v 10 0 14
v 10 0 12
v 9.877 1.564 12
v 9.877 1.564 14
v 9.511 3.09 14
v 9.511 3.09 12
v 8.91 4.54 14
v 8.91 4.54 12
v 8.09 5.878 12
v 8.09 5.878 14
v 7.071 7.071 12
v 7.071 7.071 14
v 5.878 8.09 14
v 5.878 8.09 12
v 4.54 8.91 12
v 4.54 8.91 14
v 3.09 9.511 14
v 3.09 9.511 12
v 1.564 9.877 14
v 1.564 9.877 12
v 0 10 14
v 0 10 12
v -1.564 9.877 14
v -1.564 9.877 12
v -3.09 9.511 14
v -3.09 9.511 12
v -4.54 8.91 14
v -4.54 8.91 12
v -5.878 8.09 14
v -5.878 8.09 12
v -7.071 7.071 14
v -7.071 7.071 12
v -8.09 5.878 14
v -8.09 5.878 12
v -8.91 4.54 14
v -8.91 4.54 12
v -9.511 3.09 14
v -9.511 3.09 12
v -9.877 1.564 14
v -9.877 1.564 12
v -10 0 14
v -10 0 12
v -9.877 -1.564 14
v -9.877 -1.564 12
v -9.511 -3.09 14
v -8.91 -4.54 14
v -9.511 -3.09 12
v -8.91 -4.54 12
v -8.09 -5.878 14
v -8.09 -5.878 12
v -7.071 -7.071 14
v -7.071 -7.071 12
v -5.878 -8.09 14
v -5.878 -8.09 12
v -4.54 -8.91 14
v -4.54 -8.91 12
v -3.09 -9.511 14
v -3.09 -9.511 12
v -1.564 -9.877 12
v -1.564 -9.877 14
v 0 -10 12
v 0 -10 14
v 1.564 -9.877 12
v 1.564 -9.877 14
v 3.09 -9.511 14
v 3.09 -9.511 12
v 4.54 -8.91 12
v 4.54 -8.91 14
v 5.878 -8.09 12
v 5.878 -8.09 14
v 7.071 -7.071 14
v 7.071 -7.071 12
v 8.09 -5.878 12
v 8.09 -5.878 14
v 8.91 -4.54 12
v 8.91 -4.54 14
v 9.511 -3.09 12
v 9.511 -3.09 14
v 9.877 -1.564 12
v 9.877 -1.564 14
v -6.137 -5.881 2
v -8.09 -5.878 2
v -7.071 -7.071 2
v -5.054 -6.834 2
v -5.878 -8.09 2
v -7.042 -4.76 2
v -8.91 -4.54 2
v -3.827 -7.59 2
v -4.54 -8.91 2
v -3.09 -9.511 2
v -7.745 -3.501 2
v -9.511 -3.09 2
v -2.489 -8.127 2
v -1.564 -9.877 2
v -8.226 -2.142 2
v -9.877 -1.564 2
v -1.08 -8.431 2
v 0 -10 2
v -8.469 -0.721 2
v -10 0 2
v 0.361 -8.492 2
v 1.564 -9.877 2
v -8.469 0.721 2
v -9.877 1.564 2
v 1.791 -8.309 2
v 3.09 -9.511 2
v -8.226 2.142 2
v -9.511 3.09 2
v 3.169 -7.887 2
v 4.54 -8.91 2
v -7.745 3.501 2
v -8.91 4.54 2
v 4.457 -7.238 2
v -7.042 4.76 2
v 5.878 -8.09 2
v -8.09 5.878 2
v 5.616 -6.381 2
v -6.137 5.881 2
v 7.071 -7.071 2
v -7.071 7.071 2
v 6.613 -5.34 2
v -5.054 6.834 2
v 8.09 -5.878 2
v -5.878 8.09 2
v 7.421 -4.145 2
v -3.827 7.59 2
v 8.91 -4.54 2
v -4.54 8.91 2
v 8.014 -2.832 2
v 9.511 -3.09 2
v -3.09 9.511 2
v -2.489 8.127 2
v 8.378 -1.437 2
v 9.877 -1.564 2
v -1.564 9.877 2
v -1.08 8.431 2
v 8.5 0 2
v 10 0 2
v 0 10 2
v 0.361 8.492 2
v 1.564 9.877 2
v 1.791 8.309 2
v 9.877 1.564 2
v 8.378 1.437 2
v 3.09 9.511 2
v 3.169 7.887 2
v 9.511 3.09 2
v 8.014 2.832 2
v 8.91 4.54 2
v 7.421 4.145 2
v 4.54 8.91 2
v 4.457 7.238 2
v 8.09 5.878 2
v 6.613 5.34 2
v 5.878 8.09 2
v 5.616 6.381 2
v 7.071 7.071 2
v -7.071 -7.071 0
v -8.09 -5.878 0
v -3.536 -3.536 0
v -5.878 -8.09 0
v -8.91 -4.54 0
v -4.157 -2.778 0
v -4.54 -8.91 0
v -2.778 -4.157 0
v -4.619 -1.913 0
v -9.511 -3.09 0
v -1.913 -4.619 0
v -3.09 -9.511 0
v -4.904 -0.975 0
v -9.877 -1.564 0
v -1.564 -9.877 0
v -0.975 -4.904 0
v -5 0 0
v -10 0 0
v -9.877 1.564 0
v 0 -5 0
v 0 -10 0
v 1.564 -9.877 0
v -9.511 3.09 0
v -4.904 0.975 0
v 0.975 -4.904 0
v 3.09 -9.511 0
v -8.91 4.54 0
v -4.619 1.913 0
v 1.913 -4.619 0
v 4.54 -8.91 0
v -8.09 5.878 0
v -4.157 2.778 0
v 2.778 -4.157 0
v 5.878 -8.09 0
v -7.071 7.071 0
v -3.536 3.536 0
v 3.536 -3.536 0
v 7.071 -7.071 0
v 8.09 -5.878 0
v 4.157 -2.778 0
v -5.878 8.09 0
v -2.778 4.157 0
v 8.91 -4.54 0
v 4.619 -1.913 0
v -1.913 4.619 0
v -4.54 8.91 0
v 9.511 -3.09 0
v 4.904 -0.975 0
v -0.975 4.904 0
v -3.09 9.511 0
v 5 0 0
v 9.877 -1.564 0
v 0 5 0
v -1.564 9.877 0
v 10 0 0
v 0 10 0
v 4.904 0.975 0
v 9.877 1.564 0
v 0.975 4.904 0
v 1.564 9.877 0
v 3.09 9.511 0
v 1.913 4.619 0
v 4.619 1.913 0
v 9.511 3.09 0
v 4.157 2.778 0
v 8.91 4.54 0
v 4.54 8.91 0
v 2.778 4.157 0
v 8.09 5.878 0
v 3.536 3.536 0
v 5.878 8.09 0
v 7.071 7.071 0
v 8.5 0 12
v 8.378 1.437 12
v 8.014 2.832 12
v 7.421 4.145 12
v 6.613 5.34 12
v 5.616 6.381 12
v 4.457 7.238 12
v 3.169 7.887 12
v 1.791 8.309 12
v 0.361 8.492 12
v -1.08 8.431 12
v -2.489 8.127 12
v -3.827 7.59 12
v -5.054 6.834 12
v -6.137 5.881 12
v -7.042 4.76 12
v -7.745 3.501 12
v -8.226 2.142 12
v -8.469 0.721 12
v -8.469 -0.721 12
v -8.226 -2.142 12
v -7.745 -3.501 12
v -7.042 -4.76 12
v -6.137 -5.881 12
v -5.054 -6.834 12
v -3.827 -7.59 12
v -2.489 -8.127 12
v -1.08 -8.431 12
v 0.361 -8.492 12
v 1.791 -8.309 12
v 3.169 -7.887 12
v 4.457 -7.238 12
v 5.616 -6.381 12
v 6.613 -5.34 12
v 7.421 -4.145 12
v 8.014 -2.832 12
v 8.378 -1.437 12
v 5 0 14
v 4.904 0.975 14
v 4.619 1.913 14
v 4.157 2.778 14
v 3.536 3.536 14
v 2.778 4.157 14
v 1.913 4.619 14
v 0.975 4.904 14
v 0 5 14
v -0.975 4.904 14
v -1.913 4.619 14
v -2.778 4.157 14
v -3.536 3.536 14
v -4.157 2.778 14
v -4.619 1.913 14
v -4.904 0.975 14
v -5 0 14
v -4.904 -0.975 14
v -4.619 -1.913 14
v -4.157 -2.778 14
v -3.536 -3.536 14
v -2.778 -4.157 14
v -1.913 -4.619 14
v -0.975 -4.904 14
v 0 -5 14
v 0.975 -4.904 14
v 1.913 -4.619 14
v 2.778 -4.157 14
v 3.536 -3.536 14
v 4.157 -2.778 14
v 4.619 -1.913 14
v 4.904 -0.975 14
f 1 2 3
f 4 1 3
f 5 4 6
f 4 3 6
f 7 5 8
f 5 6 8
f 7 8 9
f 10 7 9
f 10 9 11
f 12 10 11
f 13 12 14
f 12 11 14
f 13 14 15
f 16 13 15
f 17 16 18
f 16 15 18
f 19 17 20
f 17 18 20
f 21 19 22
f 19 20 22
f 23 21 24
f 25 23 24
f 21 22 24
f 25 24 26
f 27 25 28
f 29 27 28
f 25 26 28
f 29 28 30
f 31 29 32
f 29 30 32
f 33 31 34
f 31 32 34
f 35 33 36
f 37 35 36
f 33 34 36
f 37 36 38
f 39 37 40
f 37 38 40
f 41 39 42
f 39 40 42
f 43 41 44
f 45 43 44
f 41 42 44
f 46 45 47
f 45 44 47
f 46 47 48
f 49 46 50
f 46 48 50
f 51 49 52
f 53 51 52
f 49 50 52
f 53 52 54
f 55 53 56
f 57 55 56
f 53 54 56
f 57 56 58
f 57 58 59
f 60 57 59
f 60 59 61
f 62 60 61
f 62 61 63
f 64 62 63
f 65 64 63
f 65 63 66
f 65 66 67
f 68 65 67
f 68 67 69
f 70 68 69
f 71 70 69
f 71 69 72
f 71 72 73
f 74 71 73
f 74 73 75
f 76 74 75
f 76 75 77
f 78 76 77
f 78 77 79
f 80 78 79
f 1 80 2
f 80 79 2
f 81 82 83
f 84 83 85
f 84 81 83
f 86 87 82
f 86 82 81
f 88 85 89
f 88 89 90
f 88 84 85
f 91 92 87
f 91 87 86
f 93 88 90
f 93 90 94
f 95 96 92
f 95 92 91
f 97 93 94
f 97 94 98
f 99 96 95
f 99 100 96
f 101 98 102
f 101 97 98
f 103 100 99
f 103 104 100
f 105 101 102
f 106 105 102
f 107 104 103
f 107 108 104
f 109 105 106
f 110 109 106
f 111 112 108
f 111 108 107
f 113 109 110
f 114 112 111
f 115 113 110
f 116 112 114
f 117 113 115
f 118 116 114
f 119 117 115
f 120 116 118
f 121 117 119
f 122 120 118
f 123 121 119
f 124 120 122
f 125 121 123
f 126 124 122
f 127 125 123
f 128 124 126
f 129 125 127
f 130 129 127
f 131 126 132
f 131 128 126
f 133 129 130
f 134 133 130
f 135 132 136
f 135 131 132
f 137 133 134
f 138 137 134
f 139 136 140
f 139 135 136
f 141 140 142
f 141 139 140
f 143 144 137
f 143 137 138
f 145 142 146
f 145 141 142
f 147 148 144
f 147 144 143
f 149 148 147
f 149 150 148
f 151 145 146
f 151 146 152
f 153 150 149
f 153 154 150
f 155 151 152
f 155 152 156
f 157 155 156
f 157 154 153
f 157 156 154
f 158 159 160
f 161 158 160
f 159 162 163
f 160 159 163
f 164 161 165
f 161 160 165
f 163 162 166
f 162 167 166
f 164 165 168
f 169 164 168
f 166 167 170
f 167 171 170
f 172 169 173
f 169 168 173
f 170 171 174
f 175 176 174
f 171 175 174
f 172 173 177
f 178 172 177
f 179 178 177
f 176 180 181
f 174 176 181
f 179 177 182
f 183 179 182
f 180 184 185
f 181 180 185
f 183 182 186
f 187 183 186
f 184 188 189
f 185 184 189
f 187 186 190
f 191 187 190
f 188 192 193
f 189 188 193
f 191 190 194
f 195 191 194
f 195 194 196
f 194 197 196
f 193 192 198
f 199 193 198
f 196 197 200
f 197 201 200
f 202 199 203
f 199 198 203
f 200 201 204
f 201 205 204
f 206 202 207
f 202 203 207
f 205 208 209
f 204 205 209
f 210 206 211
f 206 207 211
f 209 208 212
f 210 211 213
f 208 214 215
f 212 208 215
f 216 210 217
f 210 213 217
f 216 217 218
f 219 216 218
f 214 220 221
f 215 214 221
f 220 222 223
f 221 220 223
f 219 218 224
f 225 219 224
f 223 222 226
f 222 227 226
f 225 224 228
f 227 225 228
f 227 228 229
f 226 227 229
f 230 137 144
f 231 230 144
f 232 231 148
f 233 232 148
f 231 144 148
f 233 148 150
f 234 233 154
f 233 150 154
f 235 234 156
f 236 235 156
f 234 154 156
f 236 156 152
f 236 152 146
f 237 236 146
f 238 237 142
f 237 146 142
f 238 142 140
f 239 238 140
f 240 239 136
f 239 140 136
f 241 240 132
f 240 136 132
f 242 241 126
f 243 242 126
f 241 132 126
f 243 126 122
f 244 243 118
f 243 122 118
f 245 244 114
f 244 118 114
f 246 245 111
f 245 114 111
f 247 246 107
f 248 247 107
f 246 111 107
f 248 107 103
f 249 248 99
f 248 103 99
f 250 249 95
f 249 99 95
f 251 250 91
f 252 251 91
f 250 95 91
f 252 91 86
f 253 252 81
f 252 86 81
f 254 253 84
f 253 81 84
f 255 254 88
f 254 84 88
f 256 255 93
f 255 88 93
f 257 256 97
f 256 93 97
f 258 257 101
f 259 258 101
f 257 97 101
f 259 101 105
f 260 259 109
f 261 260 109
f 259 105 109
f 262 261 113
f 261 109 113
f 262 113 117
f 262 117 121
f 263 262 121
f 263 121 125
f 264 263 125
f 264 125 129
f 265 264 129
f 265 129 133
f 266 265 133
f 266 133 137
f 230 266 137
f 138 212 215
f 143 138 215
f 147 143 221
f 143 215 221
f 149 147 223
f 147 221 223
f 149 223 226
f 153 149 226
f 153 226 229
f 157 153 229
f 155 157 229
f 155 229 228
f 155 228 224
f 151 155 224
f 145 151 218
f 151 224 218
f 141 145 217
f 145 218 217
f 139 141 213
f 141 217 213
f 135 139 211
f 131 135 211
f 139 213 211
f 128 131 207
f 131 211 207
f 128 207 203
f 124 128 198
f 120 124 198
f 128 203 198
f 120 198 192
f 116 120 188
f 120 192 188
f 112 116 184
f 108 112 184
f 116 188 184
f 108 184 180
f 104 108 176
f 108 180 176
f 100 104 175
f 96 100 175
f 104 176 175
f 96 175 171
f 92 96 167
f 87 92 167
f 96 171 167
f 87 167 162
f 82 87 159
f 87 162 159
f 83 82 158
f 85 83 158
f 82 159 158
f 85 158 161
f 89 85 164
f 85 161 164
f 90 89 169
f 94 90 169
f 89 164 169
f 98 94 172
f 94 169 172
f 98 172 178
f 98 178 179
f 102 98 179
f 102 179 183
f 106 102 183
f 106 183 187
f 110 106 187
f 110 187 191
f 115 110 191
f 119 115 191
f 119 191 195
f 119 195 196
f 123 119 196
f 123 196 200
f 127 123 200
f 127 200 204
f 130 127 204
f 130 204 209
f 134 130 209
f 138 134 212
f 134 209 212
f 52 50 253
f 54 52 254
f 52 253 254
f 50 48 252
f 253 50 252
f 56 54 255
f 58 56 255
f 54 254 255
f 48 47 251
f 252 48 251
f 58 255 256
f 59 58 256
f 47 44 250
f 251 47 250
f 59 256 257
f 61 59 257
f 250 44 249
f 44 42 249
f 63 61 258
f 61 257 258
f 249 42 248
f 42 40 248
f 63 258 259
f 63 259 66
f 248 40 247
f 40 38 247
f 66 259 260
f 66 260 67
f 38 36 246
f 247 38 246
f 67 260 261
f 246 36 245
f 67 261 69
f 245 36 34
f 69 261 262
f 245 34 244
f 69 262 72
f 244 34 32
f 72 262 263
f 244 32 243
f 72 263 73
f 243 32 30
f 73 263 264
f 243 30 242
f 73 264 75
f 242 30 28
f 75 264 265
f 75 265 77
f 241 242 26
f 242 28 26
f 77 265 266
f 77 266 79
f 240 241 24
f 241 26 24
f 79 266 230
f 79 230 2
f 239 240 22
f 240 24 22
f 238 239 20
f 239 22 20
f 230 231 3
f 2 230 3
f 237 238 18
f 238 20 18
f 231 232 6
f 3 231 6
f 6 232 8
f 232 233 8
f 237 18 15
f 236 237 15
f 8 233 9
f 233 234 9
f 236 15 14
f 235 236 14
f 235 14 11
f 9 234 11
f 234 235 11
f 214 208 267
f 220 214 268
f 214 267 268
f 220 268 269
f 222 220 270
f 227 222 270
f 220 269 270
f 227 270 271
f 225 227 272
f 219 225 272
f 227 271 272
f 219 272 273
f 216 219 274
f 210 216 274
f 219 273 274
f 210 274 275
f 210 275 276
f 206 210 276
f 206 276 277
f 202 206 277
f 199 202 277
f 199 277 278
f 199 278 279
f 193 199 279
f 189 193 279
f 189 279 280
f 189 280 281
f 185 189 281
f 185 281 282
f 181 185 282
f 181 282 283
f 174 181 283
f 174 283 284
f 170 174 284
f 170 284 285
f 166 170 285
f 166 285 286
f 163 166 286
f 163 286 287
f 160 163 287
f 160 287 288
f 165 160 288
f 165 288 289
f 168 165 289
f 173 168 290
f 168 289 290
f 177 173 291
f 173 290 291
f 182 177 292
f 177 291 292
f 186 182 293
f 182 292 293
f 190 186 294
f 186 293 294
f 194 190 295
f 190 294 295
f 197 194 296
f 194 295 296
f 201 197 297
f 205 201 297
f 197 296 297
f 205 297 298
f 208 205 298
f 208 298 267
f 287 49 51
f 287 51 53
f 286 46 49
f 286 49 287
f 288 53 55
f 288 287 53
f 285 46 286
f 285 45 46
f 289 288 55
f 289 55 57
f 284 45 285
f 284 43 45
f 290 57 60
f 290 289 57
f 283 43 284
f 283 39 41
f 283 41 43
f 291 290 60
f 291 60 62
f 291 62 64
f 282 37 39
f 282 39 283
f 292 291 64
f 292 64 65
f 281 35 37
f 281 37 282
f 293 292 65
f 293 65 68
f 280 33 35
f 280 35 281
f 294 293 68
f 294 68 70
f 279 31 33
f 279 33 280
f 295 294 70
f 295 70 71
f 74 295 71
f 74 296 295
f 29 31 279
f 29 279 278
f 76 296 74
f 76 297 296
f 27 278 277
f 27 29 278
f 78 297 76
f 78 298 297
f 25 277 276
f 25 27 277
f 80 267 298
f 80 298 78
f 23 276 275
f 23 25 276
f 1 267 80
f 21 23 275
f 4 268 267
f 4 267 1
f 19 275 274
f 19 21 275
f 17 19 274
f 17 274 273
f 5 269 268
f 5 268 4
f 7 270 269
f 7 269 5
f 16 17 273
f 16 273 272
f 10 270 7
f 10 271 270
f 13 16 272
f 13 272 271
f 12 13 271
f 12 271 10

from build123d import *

# Parameters (mm, degrees)
F0_R          = 10
F1_DEPTH      = 2
F2_R          = 8.5
F3_DEPTH      = 10
F4_R          = 10
F5_DEPTH      = 2
F6_R          = 5
F7_DEPTH      = 20
F7_DEPTH_BACK = 6


with BuildPart() as f1:
    # F0 (on Top) → F1 (new body)
    with BuildSketch(Plane.XY):
        Circle(F0_R)
    extrude(amount=F1_DEPTH)

    # F2 (on face) → F3 (join)
    with BuildSketch(Plane.XY.offset(2)):
        Circle(F2_R)
    extrude(amount=F3_DEPTH)

    # F4 (on face) → F5 (join)
    with BuildSketch(Plane.XY.offset(12)):
        Circle(F4_R)
    extrude(amount=F5_DEPTH)

    # F6 (on face) → F7 (cut, two sides)
    with BuildSketch(Plane.XY.offset(14)) as f7_sk:
        Circle(F6_R)
    extrude(amount=-F7_DEPTH, mode=Mode.SUBTRACT)
    extrude(f7_sk.sketch, amount=-F7_DEPTH_BACK, mode=Mode.SUBTRACT)


solid = f1.part
